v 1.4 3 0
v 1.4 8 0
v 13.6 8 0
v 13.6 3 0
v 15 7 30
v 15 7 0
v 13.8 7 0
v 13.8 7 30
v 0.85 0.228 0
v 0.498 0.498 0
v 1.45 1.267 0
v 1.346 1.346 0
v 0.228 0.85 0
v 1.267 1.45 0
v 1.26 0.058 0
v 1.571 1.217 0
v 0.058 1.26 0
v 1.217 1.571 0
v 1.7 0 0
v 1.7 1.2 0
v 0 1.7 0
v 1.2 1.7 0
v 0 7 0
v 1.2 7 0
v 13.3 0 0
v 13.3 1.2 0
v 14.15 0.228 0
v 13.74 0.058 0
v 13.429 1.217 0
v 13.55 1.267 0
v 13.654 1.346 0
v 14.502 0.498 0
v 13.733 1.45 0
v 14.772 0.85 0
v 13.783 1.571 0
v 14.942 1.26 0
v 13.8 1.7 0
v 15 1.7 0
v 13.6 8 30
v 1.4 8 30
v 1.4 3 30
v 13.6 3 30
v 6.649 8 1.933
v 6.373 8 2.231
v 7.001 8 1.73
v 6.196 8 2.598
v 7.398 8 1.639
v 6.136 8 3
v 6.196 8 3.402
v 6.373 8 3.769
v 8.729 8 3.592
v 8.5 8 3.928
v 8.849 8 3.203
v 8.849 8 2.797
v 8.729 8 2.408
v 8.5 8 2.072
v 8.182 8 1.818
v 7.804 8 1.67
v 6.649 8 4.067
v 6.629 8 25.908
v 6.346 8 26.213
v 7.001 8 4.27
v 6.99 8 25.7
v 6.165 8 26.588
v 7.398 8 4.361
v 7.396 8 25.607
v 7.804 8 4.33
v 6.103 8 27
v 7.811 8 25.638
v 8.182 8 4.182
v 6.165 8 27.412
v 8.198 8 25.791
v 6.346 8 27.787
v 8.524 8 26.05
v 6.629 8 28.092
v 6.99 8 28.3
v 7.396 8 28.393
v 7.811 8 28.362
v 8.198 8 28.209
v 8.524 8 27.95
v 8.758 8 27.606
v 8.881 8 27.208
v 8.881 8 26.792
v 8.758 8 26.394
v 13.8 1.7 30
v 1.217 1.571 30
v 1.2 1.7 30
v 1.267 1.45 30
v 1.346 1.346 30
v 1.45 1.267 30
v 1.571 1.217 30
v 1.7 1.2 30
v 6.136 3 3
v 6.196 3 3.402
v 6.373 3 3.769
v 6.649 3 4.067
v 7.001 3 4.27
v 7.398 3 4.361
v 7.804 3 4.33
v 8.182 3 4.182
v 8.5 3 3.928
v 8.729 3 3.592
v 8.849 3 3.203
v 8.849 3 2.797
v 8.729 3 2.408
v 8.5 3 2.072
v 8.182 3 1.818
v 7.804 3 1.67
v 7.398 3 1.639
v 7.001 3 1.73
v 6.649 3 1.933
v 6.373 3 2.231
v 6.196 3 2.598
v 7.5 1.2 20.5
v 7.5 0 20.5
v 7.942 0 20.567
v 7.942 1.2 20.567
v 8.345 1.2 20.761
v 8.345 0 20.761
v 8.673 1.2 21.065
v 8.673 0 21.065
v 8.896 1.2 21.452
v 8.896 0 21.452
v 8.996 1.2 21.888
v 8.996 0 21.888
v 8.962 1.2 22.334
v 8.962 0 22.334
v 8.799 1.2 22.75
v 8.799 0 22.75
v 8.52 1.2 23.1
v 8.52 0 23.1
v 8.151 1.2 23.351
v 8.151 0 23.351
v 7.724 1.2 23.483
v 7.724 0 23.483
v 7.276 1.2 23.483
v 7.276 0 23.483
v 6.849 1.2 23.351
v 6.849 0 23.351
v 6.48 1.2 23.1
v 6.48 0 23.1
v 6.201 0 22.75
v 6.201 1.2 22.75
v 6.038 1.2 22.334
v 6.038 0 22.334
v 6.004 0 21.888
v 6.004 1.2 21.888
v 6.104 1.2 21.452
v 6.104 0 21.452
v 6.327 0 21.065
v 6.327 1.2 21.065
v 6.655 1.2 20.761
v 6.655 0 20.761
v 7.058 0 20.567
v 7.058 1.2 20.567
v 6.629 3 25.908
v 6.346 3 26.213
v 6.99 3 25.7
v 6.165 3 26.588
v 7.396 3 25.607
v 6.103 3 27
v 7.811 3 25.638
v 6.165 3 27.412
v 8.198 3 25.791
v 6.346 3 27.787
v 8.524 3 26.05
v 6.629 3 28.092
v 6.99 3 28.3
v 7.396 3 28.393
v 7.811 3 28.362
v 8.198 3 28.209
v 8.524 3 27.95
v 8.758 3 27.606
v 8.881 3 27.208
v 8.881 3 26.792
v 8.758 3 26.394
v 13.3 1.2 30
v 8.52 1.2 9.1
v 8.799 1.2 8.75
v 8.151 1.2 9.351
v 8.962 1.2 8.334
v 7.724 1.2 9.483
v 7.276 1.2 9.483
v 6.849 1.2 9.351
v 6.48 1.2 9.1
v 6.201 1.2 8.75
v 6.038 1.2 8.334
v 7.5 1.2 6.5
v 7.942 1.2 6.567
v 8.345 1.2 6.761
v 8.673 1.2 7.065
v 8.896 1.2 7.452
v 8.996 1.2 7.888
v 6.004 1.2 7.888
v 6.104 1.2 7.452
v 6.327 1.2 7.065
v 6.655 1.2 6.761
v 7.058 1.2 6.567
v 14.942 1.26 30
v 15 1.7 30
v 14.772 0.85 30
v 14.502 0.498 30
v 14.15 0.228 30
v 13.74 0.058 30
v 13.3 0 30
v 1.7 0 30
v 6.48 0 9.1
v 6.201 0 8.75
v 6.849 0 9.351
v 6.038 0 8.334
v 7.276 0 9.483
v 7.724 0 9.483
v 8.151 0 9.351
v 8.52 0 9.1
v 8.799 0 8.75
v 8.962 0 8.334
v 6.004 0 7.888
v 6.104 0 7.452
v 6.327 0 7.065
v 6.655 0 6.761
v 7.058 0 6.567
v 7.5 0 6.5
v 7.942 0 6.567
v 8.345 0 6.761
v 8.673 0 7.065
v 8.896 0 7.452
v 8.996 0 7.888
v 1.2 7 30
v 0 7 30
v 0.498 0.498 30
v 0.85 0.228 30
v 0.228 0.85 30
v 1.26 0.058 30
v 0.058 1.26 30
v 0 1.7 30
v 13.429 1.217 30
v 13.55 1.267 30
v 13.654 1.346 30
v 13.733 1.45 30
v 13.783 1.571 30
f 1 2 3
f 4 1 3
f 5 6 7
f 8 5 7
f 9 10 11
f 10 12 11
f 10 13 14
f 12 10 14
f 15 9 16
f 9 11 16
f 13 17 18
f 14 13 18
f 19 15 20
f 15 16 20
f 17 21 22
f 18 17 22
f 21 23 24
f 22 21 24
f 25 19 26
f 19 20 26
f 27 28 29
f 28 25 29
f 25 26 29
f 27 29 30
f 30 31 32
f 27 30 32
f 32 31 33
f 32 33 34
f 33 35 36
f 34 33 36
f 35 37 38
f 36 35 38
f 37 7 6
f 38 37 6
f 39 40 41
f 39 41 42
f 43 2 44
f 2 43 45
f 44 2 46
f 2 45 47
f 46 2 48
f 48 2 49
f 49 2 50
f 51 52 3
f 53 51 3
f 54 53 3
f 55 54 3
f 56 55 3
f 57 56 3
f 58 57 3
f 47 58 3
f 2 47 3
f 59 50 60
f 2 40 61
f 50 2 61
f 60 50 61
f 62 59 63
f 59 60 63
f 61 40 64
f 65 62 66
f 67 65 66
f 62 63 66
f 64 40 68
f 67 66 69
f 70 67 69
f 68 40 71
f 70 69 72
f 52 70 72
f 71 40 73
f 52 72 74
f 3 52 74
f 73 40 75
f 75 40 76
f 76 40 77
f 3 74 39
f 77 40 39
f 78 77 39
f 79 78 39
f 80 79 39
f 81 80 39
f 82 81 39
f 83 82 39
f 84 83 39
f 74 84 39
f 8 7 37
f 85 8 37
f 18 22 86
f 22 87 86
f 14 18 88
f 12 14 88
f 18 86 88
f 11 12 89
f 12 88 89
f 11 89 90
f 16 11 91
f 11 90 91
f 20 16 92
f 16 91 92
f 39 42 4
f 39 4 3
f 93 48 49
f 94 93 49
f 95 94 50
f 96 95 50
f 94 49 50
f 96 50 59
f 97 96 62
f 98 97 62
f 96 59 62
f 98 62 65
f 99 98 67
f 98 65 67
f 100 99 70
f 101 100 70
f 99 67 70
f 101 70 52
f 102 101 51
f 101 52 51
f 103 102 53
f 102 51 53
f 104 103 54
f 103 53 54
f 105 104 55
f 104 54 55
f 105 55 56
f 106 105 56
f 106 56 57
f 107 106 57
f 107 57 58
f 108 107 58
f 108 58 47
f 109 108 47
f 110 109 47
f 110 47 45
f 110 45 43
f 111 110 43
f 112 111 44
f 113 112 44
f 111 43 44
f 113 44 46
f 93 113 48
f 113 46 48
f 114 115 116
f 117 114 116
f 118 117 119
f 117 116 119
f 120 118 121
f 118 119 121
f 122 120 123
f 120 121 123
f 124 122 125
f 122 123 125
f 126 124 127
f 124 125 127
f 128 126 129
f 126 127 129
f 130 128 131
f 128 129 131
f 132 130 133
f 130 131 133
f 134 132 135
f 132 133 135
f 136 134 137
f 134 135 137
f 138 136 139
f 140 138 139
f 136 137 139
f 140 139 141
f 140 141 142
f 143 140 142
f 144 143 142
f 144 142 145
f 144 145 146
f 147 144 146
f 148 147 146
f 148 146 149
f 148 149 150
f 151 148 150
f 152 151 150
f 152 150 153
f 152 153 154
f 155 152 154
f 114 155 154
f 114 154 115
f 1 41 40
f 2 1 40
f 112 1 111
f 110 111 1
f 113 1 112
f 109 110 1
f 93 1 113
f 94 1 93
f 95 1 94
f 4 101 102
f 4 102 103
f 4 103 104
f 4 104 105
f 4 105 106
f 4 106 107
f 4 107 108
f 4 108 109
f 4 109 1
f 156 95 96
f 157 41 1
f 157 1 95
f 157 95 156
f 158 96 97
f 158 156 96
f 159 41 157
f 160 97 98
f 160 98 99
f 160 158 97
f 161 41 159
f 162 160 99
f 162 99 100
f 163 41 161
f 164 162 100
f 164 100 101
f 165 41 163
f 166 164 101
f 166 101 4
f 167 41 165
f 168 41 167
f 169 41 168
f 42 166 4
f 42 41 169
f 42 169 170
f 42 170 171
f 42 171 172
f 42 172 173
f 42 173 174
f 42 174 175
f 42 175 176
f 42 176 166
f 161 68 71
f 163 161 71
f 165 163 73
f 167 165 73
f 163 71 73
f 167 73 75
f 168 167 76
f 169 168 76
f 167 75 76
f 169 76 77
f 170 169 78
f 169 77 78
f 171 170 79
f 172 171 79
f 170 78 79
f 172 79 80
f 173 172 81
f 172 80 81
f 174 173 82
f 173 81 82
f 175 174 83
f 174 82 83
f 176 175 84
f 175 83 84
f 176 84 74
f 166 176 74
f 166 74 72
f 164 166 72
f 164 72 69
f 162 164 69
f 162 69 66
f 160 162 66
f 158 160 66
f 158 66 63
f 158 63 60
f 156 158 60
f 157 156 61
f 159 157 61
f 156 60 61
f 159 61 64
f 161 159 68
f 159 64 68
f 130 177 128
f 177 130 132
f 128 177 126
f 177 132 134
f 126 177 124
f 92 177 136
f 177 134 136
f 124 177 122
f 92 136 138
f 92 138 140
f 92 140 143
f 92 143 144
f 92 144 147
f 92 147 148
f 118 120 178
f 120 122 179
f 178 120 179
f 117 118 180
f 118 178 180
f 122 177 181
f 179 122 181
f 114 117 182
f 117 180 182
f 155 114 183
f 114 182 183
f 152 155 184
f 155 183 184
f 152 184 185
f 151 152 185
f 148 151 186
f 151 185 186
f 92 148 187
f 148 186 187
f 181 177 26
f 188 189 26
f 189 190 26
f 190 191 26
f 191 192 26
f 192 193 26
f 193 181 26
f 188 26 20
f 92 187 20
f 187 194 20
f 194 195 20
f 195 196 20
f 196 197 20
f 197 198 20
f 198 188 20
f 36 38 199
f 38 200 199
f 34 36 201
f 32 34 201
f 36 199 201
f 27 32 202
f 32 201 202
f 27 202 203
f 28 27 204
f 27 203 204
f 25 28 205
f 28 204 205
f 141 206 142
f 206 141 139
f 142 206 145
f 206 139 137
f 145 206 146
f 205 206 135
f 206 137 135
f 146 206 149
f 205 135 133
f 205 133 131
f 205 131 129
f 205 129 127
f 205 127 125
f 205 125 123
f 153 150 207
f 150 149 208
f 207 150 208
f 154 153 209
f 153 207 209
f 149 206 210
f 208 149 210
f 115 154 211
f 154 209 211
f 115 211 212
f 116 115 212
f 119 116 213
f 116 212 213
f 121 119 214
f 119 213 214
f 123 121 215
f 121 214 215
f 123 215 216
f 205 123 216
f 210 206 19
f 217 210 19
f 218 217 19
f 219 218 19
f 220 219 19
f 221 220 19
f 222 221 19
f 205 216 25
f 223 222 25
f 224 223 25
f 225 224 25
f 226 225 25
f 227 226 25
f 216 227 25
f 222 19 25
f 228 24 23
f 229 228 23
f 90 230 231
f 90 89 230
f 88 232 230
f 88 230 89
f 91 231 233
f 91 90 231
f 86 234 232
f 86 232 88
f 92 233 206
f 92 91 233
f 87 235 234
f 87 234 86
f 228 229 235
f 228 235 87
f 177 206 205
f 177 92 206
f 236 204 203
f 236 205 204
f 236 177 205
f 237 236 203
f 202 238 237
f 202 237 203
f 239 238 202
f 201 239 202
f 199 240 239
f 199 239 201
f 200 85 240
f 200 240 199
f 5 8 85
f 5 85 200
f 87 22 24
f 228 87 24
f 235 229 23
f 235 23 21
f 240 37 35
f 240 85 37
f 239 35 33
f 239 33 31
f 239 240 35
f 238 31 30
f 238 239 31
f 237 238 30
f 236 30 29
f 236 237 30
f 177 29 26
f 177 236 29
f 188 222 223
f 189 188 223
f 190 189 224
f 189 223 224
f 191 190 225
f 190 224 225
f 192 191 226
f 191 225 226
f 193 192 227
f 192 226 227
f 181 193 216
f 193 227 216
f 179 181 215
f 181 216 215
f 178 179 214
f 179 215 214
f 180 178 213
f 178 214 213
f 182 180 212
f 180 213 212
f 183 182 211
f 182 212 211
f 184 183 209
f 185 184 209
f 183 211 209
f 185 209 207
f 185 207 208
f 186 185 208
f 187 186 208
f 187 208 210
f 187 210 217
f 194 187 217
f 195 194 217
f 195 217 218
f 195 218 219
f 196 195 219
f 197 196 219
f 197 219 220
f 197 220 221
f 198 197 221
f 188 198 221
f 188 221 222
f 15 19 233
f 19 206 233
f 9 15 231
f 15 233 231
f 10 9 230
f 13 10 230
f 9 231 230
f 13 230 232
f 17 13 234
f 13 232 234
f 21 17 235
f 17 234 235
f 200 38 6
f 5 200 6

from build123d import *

# Parameters (mm, degrees)
BOSS_EXTRU_1_DEPTH      = 30
ESQUISSE2_R             = 1.5
ENL_V_MAT_EXTRU_1_DEPTH = 35.263683398
CONG_1_R                = 0.5
CONG_2_R                = 1.7
ESQUISSE3_W             = 12.2
ESQUISSE3_H             = 5
BOSS_EXTRU_2_DEPTH      = 30
ESQUISSE4_R             = 1.364491204
ESQUISSE4_R_2           = 1.396559876
ENL_V_MAT_EXTRU_2_DEPTH = 5


with BuildPart() as part:
    # Esquisse1 → Boss.-Extru.1 (new body)
    with BuildSketch(Plane.XY):
        Polygon((0, 7), (0, 0), (15, 0), (15, 7), (13.8, 7), (13.8, 1.2), (1.2, 1.2), (1.2, 7), align=None)
    extrude(amount=BOSS_EXTRU_1_DEPTH)

    # Esquisse2 → Enlèv. mat.-Extru.1 (cut, through all)
    with BuildSketch(Plane.XZ):
        with Locations(Location((7.5, 22, 0), (0, 0, 270))):
            Circle(ESQUISSE2_R)
        with Locations(Location((7.5, 8, 0), (0, 0, 270))):
            Circle(ESQUISSE2_R)
    extrude(amount=-ENL_V_MAT_EXTRU_1_DEPTH, mode=Mode.SUBTRACT)

    # Congé1
    cong_1_edges = [part.edges().sort_by_distance(p)[0] for p in [
        (1.2, 1.2, 15),
        (13.8, 1.2, 15),
    ]]
    fillet(cong_1_edges, radius=CONG_1_R)

    # Congé2
    cong_2_edges = [part.edges().sort_by_distance(p)[0] for p in [
        (15, 0, 15),
        (0, 0, 15),
    ]]
    fillet(cong_2_edges, radius=CONG_2_R)


with BuildPart() as body_2:
    # Esquisse3 → Boss.-Extru.2 (new body)
    with BuildSketch(Plane.XY.offset(30)):
        with Locations((7.5, 5.5)):
            Rectangle(ESQUISSE3_W, ESQUISSE3_H)
    extrude(amount=-BOSS_EXTRU_2_DEPTH)

    # Esquisse4 → Enlèv. mat.-Extru.2 (cut)
    with BuildSketch(Plane(origin=(0, 8, 0), x_dir=(1, 0, 0), z_dir=(0, 1, 0))):
        with Locations(Location((7.5, -3, 0), (0, 0, 180))):
            Circle(ESQUISSE4_R)
        with Locations(Location((7.5, -27, 0), (0, 0, 180))):
            Circle(ESQUISSE4_R_2)
    extrude(amount=-ENL_V_MAT_EXTRU_2_DEPTH, mode=Mode.SUBTRACT)


solid = Compound([part.part, body_2.part])
